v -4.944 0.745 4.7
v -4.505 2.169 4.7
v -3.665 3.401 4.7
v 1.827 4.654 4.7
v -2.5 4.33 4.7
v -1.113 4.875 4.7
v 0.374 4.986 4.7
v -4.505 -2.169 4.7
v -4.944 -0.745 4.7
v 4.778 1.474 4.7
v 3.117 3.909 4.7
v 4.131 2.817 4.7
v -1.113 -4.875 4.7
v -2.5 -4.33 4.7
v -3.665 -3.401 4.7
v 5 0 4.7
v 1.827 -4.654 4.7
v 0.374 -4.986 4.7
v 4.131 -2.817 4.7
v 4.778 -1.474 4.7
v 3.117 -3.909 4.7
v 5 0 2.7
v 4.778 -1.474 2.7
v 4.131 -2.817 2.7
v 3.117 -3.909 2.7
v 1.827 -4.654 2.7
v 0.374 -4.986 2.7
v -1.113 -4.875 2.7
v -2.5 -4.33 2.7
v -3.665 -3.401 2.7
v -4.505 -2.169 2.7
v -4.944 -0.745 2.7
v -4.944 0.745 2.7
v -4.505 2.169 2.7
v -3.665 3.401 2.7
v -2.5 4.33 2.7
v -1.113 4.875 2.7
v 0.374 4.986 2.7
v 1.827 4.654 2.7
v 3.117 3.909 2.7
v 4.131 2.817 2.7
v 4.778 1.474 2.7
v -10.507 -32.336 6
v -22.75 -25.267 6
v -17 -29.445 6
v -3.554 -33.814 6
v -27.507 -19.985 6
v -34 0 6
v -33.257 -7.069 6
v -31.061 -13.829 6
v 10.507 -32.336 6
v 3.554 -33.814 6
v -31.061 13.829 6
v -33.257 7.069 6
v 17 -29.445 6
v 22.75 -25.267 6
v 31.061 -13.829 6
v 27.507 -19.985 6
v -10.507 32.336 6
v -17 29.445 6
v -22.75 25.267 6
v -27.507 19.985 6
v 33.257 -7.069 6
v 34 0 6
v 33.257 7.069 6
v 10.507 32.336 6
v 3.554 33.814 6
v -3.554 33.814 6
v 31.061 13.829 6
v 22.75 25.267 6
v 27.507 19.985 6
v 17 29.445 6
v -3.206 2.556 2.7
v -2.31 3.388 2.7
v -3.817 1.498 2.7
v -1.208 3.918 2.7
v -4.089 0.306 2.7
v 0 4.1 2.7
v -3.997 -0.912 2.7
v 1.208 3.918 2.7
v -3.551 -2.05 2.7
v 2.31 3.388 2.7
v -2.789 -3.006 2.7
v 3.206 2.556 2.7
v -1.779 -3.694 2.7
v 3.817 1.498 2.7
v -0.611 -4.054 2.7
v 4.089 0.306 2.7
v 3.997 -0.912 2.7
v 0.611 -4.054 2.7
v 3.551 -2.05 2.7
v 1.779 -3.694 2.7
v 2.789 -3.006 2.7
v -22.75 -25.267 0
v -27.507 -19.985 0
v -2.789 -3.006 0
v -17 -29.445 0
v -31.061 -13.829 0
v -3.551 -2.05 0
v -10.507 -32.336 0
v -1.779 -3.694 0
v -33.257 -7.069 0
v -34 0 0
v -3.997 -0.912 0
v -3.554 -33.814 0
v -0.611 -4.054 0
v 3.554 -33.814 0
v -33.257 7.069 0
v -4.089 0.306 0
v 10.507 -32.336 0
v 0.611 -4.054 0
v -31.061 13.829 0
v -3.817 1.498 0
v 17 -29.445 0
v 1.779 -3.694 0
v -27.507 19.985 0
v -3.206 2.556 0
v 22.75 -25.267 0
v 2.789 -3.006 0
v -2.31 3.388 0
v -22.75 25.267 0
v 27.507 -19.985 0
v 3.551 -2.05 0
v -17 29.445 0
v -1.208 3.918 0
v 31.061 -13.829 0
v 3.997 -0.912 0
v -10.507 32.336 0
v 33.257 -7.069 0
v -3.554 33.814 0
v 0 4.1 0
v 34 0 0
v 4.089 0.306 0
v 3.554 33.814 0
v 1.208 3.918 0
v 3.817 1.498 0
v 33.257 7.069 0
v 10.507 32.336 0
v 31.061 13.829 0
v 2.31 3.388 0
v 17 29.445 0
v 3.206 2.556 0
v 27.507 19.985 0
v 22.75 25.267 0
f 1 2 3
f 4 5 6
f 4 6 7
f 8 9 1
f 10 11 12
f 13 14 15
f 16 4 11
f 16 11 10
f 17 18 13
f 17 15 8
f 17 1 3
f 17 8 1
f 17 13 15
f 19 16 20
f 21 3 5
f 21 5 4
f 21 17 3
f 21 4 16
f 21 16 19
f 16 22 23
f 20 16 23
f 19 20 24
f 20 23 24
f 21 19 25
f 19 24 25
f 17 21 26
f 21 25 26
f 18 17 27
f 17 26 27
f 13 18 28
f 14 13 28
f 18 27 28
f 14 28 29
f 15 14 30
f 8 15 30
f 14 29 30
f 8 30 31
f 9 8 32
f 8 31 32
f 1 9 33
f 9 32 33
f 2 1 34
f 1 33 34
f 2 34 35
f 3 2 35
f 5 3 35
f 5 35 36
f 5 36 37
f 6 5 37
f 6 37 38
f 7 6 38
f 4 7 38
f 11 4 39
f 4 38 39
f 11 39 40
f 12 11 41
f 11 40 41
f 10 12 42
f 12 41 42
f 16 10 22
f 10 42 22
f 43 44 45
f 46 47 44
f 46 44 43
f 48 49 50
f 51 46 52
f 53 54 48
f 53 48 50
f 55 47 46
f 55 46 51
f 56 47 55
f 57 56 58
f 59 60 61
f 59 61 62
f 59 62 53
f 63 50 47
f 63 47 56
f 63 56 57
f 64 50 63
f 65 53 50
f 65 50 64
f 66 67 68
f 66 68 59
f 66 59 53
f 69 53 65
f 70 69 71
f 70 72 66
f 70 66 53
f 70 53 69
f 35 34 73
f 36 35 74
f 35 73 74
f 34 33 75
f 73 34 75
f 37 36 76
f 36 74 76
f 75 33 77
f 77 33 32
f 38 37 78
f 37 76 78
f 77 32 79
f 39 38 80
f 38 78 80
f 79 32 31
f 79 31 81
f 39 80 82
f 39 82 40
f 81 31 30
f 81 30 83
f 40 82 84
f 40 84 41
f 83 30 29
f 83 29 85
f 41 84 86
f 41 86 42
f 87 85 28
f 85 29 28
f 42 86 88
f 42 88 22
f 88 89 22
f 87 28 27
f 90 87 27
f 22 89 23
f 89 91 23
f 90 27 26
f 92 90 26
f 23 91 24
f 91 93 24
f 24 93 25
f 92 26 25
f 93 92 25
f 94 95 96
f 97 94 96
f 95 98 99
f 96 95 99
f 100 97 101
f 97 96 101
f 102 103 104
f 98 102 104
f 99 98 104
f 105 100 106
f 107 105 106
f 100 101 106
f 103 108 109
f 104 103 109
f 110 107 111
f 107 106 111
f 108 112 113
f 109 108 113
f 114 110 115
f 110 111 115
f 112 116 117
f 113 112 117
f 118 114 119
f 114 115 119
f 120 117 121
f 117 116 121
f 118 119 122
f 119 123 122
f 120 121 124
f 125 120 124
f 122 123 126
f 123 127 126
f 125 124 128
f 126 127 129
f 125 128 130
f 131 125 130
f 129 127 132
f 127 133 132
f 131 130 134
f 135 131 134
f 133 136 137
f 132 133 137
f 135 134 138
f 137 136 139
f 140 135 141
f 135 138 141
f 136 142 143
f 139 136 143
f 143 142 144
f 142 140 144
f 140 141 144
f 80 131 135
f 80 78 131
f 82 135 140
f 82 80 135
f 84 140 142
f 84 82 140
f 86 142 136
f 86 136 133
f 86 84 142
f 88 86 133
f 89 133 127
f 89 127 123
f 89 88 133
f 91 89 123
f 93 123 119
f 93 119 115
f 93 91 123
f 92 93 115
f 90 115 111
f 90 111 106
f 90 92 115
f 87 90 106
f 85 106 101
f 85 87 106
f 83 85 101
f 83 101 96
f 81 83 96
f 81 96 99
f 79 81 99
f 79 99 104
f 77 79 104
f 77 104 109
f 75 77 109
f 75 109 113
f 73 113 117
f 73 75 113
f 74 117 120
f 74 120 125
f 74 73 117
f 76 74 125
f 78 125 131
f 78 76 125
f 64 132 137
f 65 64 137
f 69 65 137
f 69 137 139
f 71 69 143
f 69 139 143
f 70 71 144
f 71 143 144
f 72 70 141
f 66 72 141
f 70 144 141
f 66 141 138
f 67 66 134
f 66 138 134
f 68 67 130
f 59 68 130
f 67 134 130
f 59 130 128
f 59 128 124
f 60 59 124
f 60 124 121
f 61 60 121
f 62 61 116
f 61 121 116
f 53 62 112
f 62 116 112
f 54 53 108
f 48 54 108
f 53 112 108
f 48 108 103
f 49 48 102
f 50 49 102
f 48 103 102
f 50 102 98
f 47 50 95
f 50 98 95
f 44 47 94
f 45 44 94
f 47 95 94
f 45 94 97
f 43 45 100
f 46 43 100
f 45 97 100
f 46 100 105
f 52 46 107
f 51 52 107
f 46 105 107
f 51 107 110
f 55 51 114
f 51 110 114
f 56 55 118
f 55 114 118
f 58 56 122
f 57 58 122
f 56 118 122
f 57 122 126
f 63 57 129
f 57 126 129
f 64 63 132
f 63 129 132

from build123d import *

# Parameters (mm, degrees)
F0_R     = 34
F1_DEPTH = 6
F2_W     = 4.1
F2_H     = 2.7
F4_R     = 5
F5_DEPTH = 2


with BuildPart() as f1:
    # F0 (on Top) → F1 (new body)
    with BuildSketch(Plane.XY):
        Circle(F0_R)
    extrude(amount=F1_DEPTH)

    # F2 (on Right) → F3 (revolve, cut)
    with BuildSketch(Plane.YZ):
        with Locations((2.05, 1.35)):
            Rectangle(F2_W, F2_H)
    revolve(axis=Axis((0, 0, 1.35), (0, 0, -1)), mode=Mode.SUBTRACT)

    # F4 (on face) → F5 (cut)
    with BuildSketch(Plane(origin=(0, 0, 2.7), x_dir=(1, 0, 0), z_dir=(0, 0, -1))):
        Circle(F4_R)
    extrude(amount=-F5_DEPTH, mode=Mode.SUBTRACT)


solid = f1.part
